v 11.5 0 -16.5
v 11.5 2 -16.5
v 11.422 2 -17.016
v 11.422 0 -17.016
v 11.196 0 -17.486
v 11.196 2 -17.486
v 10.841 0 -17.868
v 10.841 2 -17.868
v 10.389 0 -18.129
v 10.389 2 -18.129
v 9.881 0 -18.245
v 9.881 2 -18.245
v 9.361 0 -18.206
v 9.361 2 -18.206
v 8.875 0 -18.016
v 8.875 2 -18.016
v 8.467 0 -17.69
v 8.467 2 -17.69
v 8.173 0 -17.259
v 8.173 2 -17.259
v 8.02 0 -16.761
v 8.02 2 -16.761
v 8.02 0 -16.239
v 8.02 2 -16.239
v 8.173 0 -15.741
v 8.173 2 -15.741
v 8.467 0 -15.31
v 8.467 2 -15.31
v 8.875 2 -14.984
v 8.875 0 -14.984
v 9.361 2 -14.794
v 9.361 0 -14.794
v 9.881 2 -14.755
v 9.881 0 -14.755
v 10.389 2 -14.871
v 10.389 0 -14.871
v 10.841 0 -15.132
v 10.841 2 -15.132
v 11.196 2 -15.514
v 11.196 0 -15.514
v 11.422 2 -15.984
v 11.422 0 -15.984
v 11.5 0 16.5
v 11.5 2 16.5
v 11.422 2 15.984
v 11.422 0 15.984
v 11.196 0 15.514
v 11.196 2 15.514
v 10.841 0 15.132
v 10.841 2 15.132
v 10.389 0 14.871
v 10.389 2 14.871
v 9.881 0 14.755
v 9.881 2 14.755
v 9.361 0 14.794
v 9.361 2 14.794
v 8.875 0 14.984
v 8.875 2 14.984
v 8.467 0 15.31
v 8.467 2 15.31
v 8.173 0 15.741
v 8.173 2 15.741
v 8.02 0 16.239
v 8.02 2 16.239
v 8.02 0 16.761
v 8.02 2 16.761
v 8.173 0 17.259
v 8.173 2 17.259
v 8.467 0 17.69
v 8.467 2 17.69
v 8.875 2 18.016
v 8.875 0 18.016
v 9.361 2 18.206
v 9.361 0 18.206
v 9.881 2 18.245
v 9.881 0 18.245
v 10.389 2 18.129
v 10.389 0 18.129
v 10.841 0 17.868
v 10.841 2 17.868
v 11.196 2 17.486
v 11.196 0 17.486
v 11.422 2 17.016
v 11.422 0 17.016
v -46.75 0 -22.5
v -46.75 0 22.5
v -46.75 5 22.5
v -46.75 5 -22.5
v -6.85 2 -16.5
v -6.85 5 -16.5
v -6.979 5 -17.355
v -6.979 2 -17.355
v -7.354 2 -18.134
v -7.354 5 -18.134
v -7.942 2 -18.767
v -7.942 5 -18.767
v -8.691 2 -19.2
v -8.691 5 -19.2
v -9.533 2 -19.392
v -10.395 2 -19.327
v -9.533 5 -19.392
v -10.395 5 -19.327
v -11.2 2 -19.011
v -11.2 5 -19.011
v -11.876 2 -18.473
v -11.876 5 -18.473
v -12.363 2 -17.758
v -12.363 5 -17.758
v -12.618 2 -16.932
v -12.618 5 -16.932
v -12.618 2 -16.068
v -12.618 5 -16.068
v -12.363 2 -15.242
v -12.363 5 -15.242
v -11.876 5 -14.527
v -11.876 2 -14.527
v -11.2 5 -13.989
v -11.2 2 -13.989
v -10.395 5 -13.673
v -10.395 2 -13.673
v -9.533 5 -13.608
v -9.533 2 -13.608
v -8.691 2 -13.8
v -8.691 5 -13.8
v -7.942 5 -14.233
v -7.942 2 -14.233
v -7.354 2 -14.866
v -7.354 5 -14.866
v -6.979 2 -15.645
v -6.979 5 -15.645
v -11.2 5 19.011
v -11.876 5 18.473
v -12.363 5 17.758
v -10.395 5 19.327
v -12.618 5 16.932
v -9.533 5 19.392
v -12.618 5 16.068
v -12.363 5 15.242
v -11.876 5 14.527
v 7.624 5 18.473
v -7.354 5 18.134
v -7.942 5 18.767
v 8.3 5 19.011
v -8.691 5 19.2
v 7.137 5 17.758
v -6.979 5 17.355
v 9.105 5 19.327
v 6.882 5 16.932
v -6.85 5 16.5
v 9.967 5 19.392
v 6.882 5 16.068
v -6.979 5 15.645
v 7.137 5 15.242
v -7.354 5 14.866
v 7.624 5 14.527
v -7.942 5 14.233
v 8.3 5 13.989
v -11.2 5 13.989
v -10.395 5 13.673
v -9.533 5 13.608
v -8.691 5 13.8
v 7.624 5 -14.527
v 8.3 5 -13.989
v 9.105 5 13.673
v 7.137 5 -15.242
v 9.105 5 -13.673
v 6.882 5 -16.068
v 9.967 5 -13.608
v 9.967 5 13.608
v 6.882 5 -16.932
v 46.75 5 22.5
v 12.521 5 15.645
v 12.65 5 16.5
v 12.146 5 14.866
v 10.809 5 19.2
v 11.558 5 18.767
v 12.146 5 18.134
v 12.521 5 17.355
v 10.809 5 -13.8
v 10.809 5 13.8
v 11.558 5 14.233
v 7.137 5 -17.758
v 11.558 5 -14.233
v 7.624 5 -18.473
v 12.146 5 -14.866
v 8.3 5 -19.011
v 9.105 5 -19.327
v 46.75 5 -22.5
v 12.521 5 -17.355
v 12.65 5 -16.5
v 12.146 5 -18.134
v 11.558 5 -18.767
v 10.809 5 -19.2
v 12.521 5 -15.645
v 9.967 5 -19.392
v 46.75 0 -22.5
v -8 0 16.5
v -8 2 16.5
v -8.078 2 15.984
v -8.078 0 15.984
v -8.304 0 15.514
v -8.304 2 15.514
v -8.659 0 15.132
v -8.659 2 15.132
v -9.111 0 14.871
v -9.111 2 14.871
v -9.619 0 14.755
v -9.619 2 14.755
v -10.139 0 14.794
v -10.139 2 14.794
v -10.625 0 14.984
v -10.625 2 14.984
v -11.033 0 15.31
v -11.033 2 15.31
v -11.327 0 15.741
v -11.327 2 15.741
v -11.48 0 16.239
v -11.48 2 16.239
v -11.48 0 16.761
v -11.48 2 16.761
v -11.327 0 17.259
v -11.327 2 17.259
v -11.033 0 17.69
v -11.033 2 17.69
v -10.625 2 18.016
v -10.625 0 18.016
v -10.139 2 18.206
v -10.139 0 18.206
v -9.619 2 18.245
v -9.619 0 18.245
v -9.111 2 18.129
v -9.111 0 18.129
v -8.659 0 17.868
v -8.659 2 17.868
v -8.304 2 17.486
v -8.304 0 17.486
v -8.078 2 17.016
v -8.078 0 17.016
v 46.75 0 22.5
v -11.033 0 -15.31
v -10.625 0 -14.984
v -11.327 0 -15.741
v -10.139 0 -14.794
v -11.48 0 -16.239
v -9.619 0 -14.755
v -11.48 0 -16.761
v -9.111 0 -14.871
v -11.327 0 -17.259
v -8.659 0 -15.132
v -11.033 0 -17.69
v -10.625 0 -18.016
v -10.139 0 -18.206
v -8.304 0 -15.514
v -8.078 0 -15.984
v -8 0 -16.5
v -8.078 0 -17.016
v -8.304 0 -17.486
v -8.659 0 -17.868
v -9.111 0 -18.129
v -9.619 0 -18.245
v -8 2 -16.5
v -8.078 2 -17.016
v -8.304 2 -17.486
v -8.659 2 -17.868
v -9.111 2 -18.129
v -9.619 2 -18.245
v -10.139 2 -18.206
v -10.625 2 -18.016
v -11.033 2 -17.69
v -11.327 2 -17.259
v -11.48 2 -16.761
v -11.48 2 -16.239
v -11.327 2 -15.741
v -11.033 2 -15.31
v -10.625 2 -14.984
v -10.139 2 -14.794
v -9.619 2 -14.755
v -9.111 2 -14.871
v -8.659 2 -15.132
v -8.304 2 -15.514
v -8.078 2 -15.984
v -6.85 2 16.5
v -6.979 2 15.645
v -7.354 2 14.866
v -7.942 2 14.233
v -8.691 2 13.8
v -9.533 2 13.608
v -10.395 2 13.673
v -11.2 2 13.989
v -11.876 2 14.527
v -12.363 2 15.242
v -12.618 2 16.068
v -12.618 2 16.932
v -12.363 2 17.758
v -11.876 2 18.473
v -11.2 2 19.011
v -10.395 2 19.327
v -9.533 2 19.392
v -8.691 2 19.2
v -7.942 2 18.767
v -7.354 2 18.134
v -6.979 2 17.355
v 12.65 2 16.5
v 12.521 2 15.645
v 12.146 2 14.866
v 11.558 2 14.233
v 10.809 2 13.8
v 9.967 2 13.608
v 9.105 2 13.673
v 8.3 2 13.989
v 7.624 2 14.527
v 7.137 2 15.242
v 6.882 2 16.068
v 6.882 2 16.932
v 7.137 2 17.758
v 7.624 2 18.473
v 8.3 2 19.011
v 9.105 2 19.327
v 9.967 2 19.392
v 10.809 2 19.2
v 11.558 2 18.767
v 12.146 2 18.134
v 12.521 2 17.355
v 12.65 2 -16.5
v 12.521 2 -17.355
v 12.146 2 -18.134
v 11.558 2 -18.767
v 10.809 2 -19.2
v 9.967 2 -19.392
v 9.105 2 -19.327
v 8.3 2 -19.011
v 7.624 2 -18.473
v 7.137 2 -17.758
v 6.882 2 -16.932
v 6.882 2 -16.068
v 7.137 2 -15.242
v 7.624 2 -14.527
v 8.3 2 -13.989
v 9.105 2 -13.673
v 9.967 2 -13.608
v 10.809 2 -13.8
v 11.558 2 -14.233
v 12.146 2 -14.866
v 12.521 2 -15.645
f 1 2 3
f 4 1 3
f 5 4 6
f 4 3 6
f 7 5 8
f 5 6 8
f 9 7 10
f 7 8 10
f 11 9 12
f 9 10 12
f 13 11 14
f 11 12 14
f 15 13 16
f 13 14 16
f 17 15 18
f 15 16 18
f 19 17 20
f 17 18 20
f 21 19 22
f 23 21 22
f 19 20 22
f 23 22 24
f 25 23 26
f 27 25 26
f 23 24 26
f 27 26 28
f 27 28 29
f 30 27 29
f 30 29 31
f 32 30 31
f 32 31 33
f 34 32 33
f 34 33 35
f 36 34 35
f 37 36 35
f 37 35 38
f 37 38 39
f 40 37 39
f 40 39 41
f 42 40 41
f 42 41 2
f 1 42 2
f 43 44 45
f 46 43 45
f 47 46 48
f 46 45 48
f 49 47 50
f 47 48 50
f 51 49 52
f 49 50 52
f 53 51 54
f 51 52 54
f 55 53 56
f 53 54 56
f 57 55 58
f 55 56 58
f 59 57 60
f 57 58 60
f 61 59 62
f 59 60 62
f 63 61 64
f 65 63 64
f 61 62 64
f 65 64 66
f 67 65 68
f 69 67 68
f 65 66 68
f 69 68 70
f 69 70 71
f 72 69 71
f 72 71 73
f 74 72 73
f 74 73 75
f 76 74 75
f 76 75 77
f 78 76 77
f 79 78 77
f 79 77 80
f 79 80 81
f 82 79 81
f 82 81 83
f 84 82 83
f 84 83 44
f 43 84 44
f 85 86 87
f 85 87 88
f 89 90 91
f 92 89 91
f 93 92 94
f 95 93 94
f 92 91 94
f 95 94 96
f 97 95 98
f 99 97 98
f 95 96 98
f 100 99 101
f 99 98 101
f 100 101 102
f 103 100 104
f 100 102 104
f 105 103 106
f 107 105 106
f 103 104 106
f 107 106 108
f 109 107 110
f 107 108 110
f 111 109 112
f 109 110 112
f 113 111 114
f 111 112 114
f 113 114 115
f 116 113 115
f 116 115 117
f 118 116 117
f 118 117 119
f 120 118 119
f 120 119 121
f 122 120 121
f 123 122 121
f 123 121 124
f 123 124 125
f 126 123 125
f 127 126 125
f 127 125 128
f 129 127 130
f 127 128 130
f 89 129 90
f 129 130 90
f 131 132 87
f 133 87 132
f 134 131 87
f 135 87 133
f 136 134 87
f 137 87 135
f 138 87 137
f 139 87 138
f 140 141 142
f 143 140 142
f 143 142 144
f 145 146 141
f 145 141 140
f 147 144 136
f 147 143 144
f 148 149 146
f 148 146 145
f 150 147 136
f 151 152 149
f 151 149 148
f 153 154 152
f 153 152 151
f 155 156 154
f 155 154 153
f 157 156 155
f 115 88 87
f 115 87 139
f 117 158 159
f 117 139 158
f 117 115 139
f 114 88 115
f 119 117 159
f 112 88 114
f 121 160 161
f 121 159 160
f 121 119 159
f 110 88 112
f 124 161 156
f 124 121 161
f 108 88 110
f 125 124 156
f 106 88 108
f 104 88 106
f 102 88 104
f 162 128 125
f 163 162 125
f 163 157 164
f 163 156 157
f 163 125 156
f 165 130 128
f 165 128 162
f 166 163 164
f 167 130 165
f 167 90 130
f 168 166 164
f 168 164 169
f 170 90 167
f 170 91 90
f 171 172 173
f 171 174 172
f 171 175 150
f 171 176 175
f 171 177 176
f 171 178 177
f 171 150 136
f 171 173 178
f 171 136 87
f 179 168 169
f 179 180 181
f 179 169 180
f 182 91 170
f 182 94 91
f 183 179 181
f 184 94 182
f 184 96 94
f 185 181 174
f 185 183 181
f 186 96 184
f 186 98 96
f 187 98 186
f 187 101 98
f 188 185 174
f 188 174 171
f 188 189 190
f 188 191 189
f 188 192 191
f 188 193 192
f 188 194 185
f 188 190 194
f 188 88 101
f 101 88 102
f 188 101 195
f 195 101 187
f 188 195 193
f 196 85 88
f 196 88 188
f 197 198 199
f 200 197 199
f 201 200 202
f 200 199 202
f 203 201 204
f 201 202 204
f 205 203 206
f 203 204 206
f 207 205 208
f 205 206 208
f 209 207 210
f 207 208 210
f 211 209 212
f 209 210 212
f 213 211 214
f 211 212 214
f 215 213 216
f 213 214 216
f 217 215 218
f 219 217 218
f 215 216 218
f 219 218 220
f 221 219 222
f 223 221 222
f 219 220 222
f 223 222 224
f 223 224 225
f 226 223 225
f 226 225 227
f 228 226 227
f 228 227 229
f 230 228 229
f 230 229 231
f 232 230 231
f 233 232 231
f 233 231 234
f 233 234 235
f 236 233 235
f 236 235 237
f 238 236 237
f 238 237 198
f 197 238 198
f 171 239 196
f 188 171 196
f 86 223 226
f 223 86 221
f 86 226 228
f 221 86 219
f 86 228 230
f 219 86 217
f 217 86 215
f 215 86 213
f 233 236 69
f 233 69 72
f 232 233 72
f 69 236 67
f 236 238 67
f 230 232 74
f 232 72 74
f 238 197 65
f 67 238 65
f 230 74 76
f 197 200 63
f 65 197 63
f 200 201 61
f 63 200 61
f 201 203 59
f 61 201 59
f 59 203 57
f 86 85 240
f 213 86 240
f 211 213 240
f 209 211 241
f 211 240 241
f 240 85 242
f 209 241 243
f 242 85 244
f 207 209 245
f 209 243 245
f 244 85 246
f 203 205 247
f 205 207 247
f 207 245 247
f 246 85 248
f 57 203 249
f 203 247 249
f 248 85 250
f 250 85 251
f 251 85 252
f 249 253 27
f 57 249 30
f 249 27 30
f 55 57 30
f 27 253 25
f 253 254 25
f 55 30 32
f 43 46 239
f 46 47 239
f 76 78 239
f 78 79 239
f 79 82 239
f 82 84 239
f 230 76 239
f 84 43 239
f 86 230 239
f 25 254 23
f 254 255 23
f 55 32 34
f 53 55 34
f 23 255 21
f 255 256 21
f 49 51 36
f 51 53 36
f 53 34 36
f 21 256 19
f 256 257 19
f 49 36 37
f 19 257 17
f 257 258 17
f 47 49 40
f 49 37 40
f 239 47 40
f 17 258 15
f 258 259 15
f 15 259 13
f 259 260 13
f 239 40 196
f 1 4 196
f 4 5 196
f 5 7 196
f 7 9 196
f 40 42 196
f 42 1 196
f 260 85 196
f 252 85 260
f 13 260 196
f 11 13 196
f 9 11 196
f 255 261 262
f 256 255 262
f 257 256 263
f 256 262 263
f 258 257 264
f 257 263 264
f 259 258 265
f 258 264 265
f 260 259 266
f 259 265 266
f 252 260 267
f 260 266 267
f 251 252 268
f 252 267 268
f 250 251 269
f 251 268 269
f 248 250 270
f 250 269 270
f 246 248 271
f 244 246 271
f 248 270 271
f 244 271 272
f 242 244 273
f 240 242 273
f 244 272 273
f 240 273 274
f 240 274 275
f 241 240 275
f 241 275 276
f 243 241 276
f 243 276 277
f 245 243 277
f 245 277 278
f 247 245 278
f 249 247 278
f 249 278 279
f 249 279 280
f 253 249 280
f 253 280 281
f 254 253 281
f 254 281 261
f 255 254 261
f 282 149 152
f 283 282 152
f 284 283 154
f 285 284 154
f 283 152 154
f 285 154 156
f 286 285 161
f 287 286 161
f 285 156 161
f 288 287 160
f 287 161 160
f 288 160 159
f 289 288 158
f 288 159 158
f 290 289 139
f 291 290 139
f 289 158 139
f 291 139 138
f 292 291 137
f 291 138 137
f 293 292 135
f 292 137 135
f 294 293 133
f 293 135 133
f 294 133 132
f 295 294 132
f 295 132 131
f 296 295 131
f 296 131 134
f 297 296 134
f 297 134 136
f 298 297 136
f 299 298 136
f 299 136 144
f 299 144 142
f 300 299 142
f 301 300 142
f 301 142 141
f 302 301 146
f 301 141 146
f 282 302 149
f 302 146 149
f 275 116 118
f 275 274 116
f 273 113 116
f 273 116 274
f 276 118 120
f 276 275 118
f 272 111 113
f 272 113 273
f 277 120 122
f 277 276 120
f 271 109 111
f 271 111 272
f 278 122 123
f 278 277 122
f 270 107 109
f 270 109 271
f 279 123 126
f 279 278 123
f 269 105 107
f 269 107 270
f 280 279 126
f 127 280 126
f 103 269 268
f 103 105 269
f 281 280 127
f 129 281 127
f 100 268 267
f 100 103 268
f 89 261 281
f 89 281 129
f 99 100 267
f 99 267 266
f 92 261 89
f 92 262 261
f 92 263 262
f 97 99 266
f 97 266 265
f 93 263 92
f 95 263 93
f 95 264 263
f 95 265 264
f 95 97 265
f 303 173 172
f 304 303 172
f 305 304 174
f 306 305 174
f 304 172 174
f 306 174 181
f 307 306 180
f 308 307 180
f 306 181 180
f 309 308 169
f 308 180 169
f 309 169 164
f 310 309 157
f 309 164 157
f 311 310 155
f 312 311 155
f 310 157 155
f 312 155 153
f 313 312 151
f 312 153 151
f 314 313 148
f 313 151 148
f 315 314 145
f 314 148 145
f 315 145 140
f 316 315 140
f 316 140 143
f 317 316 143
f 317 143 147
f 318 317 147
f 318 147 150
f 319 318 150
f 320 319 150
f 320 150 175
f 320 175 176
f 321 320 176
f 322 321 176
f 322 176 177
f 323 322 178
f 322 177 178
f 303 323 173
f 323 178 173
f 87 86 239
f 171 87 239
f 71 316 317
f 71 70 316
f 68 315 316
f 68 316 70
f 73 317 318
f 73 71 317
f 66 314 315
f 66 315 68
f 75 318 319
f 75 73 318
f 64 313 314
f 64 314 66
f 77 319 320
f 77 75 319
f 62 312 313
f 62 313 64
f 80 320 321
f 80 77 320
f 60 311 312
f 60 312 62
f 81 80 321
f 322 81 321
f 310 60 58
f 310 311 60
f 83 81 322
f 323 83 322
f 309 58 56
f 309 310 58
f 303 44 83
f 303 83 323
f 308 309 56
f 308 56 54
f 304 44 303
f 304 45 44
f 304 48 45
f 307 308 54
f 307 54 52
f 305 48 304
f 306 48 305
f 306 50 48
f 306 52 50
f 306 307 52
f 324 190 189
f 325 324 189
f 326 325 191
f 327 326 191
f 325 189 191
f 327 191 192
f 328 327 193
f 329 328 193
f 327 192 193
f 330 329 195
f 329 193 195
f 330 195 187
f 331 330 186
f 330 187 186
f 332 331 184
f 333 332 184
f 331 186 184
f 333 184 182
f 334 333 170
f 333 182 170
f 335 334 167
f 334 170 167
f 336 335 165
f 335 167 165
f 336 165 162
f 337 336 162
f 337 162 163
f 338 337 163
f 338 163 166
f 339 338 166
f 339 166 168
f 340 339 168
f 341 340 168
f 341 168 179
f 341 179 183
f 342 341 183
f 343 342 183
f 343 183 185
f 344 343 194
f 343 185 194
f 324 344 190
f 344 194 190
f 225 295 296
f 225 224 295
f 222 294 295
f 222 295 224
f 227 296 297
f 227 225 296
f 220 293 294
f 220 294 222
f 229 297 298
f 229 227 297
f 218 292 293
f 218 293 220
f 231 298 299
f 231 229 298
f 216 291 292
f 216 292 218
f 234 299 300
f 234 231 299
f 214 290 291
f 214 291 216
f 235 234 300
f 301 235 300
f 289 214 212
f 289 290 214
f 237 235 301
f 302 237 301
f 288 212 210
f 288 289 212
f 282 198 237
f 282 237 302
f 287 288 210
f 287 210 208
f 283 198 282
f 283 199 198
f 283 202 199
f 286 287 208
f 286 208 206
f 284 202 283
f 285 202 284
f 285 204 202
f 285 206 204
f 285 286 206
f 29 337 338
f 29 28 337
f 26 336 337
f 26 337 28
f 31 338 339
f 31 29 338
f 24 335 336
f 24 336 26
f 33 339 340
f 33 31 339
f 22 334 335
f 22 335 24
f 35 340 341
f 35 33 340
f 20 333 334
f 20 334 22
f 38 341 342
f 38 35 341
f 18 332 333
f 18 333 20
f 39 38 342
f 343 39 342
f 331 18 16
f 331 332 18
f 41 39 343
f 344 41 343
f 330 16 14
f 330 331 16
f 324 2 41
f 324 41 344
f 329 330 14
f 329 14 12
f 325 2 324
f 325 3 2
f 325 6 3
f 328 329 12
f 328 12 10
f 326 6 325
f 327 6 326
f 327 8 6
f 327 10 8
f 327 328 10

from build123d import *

# Parameters (mm, degrees)
SKETCH1_W               = 93.5
SKETCH1_H               = 45
BOSS_EXTRUDE1_DEPTH     = 5
SKETCH2_R               = 1.75
CUT_EXTRUDE1_DEPTH      = 1
CUT_EXTRUDE1_DEPTH_BACK = 6
SKETCH3_R               = 2.9
CUT_EXTRUDE2_DEPTH      = 1
CUT_EXTRUDE2_DEPTH_BACK = 3


with BuildPart() as part:
    # Sketch1 → Boss-Extrude1 (new body)
    with BuildSketch(Plane(origin=(0, 0, 0), x_dir=(1, 0, 0), z_dir=(0, 1, 0))):
        Rectangle(SKETCH1_W, SKETCH1_H)
    extrude(amount=BOSS_EXTRUDE1_DEPTH)

    # Sketch2 → Cut-Extrude1 (cut, two sides)
    with BuildSketch(Plane(origin=(0, 5, 0), x_dir=(1, 0, 0), z_dir=(0, 1, 0))) as cut_extrude1_sk:
        with Locations((-9.75, -16.5)):
            Circle(SKETCH2_R)
        with Locations((-9.75, 16.5)):
            Circle(SKETCH2_R)
        with Locations((9.75, -16.5)):
            Circle(SKETCH2_R)
        with Locations((9.75, 16.5)):
            Circle(SKETCH2_R)
    extrude(amount=CUT_EXTRUDE1_DEPTH, mode=Mode.SUBTRACT)
    extrude(cut_extrude1_sk.sketch, amount=-CUT_EXTRUDE1_DEPTH_BACK, mode=Mode.SUBTRACT)

    # Sketch3 → Cut-Extrude2 (cut, two sides)
    with BuildSketch(Plane(origin=(0, 5, 0), x_dir=(1, 0, 0), z_dir=(0, 1, 0))) as cut_extrude2_sk:
        with Locations((-9.75, 16.5)):
            Circle(SKETCH3_R)
        with Locations((9.75, 16.5)):
            Circle(SKETCH3_R)
        with Locations((9.75, -16.5)):
            Circle(SKETCH3_R)
        with Locations((-9.75, -16.5)):
            Circle(SKETCH3_R)
    extrude(amount=CUT_EXTRUDE2_DEPTH, mode=Mode.SUBTRACT)
    extrude(cut_extrude2_sk.sketch, amount=-CUT_EXTRUDE2_DEPTH_BACK, mode=Mode.SUBTRACT)


solid = part.part
